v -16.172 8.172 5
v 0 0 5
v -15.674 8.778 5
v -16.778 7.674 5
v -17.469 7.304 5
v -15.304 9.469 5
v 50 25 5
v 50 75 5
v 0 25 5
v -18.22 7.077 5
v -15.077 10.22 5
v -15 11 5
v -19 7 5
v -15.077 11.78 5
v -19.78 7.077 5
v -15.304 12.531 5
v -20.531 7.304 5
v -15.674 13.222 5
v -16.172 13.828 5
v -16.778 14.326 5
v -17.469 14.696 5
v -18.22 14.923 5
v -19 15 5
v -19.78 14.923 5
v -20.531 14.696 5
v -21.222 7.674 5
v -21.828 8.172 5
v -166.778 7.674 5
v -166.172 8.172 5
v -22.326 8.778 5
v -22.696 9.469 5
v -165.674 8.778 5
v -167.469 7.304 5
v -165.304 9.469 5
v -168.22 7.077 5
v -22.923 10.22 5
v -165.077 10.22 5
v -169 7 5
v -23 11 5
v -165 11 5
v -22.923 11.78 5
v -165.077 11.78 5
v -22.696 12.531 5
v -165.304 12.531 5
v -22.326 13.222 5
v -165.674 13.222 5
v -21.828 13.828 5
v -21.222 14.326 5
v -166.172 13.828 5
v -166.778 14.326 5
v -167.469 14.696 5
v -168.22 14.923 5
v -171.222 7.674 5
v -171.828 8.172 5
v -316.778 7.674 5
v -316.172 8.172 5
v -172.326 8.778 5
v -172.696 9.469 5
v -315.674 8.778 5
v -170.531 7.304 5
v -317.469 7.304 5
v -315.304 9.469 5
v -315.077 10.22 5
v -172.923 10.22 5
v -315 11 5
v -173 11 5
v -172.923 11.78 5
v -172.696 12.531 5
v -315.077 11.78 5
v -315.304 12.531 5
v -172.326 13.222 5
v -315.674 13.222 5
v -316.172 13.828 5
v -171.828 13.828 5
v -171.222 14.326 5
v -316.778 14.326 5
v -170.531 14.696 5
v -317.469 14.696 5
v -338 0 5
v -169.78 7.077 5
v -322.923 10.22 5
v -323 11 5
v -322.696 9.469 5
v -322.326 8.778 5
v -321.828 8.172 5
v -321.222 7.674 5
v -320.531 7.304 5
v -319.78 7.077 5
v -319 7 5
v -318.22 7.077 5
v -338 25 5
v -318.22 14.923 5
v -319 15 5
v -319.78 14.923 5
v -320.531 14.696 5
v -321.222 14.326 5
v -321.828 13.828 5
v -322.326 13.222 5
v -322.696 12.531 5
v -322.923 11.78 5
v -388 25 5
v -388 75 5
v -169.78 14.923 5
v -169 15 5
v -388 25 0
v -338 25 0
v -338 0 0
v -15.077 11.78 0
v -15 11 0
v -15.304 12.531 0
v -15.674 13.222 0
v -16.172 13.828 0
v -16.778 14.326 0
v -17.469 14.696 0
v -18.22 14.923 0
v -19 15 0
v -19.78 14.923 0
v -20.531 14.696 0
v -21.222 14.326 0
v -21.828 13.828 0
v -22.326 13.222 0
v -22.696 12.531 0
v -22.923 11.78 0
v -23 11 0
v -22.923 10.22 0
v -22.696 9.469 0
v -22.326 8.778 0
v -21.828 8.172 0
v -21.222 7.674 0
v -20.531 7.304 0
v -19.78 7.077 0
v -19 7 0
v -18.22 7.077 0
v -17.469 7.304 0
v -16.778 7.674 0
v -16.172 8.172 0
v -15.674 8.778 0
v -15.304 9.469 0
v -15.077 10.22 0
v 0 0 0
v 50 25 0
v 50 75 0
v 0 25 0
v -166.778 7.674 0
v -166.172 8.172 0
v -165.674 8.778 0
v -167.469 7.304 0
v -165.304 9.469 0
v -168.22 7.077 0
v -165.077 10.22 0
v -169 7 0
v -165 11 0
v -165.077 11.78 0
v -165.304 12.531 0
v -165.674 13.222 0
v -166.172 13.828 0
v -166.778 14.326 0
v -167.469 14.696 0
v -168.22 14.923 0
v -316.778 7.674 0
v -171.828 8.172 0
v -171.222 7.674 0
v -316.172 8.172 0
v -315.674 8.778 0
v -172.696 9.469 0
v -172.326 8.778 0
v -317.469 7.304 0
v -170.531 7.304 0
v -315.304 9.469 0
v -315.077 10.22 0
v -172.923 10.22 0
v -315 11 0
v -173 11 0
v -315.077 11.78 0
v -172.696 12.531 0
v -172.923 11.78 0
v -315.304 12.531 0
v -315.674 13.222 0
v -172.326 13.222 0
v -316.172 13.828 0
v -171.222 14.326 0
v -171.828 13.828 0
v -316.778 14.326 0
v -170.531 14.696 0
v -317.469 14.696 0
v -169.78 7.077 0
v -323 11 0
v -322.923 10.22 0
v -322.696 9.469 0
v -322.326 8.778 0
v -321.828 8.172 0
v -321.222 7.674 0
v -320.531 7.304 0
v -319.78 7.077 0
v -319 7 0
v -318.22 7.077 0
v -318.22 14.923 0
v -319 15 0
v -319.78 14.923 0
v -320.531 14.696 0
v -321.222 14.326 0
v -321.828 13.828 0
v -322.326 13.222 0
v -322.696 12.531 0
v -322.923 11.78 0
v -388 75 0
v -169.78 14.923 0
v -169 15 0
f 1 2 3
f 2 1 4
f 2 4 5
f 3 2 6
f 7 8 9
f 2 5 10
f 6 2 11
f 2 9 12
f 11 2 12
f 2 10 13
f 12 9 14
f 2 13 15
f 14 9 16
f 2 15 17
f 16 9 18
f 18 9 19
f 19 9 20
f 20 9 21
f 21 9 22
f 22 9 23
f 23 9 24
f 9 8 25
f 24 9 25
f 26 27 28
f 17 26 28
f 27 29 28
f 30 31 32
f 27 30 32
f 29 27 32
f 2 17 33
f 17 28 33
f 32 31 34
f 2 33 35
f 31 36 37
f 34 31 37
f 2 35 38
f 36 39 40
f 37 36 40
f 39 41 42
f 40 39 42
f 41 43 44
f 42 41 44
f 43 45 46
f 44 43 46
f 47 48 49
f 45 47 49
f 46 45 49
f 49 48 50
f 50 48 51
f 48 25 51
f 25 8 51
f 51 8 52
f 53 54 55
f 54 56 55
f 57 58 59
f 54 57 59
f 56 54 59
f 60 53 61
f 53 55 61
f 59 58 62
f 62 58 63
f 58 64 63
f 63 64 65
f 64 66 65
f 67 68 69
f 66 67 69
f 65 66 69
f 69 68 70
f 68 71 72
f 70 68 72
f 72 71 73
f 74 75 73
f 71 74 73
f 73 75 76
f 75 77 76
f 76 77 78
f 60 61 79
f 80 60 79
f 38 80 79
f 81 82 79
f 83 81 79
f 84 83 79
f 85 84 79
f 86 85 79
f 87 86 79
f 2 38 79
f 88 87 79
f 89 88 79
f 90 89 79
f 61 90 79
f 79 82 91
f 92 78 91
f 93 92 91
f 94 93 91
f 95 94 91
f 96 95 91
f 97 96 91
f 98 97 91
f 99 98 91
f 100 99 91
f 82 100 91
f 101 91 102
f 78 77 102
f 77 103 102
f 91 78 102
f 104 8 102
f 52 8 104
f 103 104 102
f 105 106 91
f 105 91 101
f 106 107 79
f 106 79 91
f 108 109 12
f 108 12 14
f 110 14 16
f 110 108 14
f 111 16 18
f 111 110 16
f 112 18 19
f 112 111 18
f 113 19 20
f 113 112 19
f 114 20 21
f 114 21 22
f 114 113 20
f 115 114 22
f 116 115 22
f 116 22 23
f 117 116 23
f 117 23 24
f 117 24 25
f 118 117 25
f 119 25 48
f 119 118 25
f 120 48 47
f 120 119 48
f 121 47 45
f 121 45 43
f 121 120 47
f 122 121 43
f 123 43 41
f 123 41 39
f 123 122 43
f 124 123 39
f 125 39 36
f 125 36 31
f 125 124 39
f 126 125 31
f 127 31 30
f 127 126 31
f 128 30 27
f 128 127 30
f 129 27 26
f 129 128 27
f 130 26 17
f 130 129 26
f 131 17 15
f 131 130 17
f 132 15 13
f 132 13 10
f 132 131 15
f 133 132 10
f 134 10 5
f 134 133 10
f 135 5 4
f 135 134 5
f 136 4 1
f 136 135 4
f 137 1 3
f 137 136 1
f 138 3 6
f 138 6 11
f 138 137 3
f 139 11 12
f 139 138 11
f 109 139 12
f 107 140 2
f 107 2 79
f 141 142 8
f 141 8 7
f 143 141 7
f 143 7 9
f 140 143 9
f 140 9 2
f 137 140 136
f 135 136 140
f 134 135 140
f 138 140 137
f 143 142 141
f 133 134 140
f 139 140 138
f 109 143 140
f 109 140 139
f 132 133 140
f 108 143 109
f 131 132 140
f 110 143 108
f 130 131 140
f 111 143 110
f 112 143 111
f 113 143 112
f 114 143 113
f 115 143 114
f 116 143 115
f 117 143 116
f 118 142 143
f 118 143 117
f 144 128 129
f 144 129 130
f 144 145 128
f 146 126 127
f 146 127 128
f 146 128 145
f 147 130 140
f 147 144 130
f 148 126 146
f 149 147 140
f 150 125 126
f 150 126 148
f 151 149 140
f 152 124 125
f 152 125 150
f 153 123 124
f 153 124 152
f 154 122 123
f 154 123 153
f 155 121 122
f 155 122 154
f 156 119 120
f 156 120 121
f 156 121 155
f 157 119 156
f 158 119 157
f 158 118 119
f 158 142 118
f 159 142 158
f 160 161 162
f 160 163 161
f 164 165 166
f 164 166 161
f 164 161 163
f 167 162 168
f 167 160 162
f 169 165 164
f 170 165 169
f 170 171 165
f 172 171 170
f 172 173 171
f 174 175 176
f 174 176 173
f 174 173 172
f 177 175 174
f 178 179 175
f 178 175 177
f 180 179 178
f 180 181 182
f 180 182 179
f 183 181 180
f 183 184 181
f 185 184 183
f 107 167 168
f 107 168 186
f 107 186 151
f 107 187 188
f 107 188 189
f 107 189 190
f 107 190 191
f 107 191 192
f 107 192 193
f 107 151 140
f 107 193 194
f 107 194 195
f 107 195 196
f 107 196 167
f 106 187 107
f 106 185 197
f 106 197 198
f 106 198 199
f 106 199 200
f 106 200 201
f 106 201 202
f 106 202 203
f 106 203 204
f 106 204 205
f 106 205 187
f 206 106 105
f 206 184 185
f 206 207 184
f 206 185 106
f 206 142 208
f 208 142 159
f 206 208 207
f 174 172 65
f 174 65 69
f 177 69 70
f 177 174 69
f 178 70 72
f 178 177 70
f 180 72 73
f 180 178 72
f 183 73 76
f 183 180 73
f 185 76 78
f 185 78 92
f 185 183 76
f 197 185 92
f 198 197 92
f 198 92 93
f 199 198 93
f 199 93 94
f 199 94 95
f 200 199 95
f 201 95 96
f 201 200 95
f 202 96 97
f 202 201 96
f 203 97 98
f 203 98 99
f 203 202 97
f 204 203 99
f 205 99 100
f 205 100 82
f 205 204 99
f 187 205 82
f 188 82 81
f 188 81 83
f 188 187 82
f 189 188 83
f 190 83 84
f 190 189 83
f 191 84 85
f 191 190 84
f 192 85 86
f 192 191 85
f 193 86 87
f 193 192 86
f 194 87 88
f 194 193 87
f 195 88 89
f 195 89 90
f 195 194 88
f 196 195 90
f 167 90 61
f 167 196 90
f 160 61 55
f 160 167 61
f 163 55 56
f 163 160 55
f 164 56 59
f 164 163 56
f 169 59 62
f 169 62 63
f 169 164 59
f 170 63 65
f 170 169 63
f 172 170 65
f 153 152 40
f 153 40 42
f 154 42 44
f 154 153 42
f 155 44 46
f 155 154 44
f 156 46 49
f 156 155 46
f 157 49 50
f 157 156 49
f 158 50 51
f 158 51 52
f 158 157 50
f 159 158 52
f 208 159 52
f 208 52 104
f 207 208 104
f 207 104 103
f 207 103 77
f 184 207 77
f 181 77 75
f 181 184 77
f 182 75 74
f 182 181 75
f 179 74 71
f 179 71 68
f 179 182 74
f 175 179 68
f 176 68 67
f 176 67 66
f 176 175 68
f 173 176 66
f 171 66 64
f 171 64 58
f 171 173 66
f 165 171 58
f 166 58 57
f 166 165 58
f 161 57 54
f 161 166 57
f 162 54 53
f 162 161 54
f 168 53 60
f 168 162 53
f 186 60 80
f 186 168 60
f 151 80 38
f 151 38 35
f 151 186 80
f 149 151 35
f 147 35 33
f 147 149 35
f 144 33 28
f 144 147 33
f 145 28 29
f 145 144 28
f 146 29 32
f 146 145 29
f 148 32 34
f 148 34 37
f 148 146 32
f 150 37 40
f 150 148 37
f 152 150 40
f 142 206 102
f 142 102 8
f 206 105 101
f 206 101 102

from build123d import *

# Parameters (mm, degrees)
CROQUIS1_R              = 4
SALIENTE_EXTRUIR1_DEPTH = 5


with BuildPart() as part:
    # Croquis1 → Saliente-Extruir1 (new body)
    with BuildSketch(Plane.XY):
        Polygon((0, 0), (-338, 0), (-338, 25), (-388, 25), (-388, 75), (50, 75), (50, 25), (0, 25), align=None)
        with Locations((-319, 11)):
            Circle(CROQUIS1_R, mode=Mode.SUBTRACT)
        with Locations((-19, 11)):
            Circle(CROQUIS1_R, mode=Mode.SUBTRACT)
        with Locations((-169, 11)):
            Circle(CROQUIS1_R, mode=Mode.SUBTRACT)
    extrude(amount=SALIENTE_EXTRUIR1_DEPTH)


solid = part.part
